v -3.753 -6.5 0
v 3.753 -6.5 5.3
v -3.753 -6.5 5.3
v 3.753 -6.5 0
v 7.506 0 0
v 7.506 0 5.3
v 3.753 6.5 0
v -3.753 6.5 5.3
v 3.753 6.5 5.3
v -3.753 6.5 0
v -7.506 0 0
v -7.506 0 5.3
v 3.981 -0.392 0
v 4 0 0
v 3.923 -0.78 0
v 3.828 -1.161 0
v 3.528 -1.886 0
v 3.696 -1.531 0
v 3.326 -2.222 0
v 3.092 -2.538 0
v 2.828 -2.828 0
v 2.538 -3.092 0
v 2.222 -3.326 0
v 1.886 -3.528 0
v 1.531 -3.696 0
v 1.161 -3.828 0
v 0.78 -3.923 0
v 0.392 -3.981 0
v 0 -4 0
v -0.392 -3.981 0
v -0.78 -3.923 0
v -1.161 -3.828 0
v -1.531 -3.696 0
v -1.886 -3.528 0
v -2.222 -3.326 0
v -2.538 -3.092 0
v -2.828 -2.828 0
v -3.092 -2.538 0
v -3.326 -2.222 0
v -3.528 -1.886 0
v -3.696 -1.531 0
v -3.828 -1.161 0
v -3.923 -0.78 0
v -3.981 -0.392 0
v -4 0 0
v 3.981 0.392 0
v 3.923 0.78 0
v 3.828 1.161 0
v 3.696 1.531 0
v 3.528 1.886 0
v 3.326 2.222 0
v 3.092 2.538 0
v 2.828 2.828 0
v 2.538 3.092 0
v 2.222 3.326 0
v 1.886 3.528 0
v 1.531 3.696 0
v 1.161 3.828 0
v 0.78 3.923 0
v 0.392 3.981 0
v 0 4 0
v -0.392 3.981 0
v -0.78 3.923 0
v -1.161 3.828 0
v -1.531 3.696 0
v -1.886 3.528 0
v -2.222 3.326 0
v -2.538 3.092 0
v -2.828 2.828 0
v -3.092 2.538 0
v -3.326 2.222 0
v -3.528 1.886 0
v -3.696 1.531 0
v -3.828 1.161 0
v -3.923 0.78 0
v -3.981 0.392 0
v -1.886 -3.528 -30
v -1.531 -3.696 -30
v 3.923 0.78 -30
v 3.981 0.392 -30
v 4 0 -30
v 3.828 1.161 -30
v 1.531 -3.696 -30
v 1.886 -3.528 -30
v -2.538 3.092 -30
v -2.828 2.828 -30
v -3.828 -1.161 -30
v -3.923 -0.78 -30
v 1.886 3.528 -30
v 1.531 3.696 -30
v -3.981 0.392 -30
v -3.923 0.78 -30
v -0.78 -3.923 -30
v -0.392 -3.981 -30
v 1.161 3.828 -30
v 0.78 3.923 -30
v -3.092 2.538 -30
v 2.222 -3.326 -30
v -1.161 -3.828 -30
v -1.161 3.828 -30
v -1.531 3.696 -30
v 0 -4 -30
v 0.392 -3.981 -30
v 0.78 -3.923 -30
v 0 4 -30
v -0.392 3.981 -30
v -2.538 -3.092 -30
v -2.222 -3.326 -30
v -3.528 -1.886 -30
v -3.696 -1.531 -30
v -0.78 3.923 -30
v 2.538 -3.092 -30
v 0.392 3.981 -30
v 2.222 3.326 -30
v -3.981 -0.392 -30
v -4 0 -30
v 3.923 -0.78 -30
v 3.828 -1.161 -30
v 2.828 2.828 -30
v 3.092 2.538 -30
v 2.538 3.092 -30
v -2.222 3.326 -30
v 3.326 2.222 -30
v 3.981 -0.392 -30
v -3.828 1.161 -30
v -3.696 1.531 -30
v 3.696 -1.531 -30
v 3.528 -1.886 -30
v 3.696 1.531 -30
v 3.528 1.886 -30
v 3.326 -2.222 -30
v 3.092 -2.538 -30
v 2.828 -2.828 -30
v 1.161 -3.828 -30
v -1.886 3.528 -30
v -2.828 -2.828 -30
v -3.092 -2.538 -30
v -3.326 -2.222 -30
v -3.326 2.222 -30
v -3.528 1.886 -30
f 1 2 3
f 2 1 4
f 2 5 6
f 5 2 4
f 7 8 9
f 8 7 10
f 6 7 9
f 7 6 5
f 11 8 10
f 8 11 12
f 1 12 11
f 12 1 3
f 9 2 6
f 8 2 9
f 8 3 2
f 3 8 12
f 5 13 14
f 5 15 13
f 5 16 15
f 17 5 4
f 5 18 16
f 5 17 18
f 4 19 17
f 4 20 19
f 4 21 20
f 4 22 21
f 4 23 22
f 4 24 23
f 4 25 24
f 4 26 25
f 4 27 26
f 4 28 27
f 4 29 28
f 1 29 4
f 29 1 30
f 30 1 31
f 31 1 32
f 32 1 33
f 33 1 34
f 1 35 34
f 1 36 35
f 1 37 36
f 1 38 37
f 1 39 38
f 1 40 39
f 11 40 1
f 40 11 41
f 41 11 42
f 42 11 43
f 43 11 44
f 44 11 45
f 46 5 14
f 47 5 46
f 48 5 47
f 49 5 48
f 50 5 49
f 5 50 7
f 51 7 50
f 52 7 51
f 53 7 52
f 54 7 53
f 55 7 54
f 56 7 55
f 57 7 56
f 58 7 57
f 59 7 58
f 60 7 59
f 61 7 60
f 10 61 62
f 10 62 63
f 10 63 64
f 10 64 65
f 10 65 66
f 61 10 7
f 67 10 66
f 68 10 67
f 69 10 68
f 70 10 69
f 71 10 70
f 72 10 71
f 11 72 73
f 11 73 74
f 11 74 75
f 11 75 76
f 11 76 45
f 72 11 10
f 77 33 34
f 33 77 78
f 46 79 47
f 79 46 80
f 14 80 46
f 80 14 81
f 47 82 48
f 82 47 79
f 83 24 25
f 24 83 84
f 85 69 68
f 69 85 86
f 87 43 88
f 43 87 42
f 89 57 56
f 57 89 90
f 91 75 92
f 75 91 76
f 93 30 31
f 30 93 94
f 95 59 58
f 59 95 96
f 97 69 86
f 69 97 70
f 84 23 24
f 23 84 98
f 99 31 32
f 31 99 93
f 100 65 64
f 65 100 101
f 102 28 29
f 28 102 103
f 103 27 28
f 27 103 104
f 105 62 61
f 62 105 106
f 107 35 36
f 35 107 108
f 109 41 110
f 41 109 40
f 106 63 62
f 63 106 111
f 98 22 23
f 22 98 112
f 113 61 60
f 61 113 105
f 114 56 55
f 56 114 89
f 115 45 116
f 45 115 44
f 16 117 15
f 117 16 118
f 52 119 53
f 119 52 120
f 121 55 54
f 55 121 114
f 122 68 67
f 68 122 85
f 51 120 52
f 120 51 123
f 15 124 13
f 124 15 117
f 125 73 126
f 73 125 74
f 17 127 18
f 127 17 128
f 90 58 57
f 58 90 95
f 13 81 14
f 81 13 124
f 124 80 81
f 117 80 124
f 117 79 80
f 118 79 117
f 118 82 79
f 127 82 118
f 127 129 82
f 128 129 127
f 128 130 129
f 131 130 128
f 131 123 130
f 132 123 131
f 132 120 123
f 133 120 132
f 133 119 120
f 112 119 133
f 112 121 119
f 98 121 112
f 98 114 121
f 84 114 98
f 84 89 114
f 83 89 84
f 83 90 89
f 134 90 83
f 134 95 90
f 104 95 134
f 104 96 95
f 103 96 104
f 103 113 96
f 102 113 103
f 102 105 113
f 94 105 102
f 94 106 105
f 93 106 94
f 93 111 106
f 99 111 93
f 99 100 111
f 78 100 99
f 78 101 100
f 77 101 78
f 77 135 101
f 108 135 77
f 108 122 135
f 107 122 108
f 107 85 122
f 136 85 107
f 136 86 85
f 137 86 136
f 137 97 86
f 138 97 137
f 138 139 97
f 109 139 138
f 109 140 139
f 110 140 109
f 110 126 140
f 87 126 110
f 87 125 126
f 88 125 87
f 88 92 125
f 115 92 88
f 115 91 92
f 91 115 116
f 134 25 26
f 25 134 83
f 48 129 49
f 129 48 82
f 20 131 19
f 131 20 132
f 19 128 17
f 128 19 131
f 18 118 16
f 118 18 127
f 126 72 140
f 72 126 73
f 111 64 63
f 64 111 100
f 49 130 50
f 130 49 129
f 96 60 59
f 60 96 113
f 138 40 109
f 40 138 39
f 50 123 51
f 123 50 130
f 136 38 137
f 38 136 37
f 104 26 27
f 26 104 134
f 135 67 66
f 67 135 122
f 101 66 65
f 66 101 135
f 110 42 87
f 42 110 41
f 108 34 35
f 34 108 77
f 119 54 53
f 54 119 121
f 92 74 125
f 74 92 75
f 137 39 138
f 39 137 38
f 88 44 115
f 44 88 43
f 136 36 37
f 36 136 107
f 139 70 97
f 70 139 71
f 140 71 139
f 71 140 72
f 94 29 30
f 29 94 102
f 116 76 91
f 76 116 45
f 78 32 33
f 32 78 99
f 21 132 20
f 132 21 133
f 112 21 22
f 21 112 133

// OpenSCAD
$fn = 64;

// M8 hex bolt (thread omitted)
// Head: hex prism, across flats = 13 mm, height = 5.3 mm
// Shank: cylinder, diameter = 8 mm, length = 30 mm
// Head bottom face at z = 0, shank extends toward negative Z

head_af = 13;
head_h = 5.3;
shank_d = 8;
shank_l = 30;

// For a regular hexagon, across flats = 2 * apothem = sqrt(3) * circumradius
hex_r = head_af / sqrt(3);

union() {
    cylinder(h = head_h, r = hex_r, $fn = 6);
    translate([0, 0, -shank_l])
        cylinder(h = shank_l, d = shank_d);
}
